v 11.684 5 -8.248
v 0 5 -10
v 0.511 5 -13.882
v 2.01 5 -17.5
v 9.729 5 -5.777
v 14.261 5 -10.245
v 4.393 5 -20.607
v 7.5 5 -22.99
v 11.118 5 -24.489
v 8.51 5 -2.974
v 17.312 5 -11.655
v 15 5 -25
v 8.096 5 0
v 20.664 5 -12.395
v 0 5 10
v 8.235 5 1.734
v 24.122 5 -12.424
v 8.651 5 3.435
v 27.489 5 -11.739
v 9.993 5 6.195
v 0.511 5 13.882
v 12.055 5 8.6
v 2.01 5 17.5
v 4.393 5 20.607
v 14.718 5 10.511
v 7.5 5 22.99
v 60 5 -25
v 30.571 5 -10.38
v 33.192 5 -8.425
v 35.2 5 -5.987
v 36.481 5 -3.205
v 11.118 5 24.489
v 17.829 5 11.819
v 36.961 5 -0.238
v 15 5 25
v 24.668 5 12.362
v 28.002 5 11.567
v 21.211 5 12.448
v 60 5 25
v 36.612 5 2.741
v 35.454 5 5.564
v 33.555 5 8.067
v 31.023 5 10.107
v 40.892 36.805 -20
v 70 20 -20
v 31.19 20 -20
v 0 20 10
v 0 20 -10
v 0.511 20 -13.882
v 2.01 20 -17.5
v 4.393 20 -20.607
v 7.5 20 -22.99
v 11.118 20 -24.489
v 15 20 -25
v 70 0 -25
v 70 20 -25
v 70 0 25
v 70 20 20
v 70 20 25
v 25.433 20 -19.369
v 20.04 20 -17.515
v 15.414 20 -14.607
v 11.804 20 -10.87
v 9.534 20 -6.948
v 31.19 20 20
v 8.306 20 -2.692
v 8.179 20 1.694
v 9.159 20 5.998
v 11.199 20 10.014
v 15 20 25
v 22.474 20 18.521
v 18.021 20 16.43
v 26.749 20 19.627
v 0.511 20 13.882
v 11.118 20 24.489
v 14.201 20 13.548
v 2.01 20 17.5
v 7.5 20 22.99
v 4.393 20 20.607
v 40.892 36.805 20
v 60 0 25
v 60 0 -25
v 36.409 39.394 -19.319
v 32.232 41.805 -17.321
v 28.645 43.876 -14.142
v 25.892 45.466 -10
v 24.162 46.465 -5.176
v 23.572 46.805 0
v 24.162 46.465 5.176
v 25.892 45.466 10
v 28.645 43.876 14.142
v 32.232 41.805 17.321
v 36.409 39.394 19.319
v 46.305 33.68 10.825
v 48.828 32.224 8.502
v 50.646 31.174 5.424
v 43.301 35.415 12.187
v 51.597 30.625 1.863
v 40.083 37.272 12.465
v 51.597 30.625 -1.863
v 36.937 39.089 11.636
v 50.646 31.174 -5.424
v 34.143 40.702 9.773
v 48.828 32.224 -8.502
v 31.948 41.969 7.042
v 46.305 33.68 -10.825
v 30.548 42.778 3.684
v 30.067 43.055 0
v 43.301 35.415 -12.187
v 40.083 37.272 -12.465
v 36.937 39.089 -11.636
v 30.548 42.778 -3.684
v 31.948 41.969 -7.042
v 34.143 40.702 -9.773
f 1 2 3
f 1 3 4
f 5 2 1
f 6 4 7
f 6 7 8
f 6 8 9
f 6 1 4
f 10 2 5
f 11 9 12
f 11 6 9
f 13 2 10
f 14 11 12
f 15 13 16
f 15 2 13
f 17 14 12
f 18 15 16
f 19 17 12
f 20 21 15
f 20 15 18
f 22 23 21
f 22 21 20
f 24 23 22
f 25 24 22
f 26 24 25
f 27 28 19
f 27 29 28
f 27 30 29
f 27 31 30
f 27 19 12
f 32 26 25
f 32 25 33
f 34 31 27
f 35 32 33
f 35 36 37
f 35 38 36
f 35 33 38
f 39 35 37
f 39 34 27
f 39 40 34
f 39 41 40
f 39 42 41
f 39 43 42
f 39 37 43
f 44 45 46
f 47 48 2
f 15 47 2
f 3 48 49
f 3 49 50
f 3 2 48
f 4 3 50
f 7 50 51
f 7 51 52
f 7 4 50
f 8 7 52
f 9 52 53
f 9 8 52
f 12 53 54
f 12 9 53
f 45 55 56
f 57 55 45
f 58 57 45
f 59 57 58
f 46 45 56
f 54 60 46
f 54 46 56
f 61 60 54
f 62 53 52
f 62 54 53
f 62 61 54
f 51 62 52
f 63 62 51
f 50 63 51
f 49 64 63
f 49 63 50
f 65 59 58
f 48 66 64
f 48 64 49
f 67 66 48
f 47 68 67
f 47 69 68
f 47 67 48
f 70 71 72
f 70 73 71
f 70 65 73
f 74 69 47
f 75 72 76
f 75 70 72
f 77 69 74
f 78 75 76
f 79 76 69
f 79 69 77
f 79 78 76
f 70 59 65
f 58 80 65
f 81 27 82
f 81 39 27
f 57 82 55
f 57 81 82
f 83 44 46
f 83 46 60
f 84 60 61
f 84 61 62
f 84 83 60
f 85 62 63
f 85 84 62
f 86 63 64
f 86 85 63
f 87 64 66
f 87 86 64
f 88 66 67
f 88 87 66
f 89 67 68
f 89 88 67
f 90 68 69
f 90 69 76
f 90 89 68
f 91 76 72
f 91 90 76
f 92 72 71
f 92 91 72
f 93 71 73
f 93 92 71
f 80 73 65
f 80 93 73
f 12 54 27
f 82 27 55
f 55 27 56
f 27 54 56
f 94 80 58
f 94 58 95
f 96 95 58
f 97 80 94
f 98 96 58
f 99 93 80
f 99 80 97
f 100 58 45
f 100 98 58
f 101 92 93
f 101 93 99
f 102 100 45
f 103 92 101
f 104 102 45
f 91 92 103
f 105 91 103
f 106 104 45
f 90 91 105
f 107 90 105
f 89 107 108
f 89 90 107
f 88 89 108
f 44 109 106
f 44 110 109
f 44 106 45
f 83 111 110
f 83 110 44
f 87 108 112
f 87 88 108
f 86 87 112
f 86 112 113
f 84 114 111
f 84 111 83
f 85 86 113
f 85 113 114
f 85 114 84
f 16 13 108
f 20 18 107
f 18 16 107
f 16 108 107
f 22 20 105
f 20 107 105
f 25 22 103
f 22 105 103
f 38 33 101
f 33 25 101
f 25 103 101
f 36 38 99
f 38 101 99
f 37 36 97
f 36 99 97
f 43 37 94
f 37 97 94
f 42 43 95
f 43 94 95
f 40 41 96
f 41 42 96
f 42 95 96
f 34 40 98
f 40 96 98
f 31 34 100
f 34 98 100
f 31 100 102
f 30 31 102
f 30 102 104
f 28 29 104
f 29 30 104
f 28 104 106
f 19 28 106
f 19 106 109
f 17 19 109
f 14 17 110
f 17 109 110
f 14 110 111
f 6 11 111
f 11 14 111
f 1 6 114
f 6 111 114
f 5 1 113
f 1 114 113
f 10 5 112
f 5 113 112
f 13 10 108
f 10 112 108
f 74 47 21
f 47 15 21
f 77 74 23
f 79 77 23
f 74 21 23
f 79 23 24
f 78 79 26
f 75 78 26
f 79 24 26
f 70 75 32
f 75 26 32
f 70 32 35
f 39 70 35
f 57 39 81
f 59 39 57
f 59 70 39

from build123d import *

# Parameters (mm, degrees)
BOSS_EXTRUDE1_DEPTH = 25
FILLET1_R           = 15
BOSS_EXTRUDE2_REACH = 69.823
SKETCH3_R           = 12.5
CUT_EXTRUDE1_DEPTH  = 68.823299831


with BuildPart() as part:
    # Sketch1 → Boss-Extrude1 (new, symmetric)
    with BuildSketch(Plane.XY):
        Polygon((60, 0), (70, 0), (70, 20), (0, 20), (0, 5), (60, 5), align=None)
    extrude(amount=BOSS_EXTRUDE1_DEPTH, both=True)

    # Fillet1
    fillet1_edges = [part.edges().sort_by_distance(p)[0] for p in [
        (0, 12.5, 25),
        (0, 12.5, -25),
    ]]
    fillet(fillet1_edges, radius=FILLET1_R)

    # Boss-Extrude2: up to this face of the body (flat: up to its plane)
    boss_extrude2_end = Plane(part.part.faces().sort_by_distance((35.898040292, 20, 0))[0])
    # Sketch2 → Boss-Extrude2 (add, up to the picked face)
    with BuildSketch(Plane(origin=(26.160254038, 45.310889132, 0), x_dir=(0, 0, -1), z_dir=(0.500000000000001, 0.866025403784438, 0)), mode=Mode.PRIVATE) as boss_extrude2_sk1:
        with BuildLine():
            Line((-20, -50.621778265), (20, -50.621778265))
            Line((20, -50.621778265), (20, -17.011053667))
            ThreePointArc((20, -17.011053667), (0, 2.988946333), (-20, -17.011053667))
            Line((-20, -17.011053667), (-20, -50.621778265))
        make_face()
    boss_extrude2_tool1 = split(extrude(boss_extrude2_sk1.sketch, amount=-BOSS_EXTRUDE2_REACH, mode=Mode.PRIVATE), bisect_by=boss_extrude2_end, keep=Keep.BOTH, mode=Mode.PRIVATE)
    add(boss_extrude2_tool1.solids().sort_by(Axis((48.469429, 32.430681, 0), (-0.500000000000001, -0.866025403784438, 0)))[0])

    # Sketch3 → Cut-Extrude1 (cut, through all)
    with BuildSketch(Plane(origin=(26.160254038, 45.310889132, 0), x_dir=(0, 0, -1), z_dir=(0.500000000000001, 0.866025403784438, 0))):
        with Locations(Location((0, -17.011053667, 0), (0, 0, 90))):
            Circle(SKETCH3_R)
    extrude(amount=-CUT_EXTRUDE1_DEPTH, mode=Mode.SUBTRACT)


solid = part.part
